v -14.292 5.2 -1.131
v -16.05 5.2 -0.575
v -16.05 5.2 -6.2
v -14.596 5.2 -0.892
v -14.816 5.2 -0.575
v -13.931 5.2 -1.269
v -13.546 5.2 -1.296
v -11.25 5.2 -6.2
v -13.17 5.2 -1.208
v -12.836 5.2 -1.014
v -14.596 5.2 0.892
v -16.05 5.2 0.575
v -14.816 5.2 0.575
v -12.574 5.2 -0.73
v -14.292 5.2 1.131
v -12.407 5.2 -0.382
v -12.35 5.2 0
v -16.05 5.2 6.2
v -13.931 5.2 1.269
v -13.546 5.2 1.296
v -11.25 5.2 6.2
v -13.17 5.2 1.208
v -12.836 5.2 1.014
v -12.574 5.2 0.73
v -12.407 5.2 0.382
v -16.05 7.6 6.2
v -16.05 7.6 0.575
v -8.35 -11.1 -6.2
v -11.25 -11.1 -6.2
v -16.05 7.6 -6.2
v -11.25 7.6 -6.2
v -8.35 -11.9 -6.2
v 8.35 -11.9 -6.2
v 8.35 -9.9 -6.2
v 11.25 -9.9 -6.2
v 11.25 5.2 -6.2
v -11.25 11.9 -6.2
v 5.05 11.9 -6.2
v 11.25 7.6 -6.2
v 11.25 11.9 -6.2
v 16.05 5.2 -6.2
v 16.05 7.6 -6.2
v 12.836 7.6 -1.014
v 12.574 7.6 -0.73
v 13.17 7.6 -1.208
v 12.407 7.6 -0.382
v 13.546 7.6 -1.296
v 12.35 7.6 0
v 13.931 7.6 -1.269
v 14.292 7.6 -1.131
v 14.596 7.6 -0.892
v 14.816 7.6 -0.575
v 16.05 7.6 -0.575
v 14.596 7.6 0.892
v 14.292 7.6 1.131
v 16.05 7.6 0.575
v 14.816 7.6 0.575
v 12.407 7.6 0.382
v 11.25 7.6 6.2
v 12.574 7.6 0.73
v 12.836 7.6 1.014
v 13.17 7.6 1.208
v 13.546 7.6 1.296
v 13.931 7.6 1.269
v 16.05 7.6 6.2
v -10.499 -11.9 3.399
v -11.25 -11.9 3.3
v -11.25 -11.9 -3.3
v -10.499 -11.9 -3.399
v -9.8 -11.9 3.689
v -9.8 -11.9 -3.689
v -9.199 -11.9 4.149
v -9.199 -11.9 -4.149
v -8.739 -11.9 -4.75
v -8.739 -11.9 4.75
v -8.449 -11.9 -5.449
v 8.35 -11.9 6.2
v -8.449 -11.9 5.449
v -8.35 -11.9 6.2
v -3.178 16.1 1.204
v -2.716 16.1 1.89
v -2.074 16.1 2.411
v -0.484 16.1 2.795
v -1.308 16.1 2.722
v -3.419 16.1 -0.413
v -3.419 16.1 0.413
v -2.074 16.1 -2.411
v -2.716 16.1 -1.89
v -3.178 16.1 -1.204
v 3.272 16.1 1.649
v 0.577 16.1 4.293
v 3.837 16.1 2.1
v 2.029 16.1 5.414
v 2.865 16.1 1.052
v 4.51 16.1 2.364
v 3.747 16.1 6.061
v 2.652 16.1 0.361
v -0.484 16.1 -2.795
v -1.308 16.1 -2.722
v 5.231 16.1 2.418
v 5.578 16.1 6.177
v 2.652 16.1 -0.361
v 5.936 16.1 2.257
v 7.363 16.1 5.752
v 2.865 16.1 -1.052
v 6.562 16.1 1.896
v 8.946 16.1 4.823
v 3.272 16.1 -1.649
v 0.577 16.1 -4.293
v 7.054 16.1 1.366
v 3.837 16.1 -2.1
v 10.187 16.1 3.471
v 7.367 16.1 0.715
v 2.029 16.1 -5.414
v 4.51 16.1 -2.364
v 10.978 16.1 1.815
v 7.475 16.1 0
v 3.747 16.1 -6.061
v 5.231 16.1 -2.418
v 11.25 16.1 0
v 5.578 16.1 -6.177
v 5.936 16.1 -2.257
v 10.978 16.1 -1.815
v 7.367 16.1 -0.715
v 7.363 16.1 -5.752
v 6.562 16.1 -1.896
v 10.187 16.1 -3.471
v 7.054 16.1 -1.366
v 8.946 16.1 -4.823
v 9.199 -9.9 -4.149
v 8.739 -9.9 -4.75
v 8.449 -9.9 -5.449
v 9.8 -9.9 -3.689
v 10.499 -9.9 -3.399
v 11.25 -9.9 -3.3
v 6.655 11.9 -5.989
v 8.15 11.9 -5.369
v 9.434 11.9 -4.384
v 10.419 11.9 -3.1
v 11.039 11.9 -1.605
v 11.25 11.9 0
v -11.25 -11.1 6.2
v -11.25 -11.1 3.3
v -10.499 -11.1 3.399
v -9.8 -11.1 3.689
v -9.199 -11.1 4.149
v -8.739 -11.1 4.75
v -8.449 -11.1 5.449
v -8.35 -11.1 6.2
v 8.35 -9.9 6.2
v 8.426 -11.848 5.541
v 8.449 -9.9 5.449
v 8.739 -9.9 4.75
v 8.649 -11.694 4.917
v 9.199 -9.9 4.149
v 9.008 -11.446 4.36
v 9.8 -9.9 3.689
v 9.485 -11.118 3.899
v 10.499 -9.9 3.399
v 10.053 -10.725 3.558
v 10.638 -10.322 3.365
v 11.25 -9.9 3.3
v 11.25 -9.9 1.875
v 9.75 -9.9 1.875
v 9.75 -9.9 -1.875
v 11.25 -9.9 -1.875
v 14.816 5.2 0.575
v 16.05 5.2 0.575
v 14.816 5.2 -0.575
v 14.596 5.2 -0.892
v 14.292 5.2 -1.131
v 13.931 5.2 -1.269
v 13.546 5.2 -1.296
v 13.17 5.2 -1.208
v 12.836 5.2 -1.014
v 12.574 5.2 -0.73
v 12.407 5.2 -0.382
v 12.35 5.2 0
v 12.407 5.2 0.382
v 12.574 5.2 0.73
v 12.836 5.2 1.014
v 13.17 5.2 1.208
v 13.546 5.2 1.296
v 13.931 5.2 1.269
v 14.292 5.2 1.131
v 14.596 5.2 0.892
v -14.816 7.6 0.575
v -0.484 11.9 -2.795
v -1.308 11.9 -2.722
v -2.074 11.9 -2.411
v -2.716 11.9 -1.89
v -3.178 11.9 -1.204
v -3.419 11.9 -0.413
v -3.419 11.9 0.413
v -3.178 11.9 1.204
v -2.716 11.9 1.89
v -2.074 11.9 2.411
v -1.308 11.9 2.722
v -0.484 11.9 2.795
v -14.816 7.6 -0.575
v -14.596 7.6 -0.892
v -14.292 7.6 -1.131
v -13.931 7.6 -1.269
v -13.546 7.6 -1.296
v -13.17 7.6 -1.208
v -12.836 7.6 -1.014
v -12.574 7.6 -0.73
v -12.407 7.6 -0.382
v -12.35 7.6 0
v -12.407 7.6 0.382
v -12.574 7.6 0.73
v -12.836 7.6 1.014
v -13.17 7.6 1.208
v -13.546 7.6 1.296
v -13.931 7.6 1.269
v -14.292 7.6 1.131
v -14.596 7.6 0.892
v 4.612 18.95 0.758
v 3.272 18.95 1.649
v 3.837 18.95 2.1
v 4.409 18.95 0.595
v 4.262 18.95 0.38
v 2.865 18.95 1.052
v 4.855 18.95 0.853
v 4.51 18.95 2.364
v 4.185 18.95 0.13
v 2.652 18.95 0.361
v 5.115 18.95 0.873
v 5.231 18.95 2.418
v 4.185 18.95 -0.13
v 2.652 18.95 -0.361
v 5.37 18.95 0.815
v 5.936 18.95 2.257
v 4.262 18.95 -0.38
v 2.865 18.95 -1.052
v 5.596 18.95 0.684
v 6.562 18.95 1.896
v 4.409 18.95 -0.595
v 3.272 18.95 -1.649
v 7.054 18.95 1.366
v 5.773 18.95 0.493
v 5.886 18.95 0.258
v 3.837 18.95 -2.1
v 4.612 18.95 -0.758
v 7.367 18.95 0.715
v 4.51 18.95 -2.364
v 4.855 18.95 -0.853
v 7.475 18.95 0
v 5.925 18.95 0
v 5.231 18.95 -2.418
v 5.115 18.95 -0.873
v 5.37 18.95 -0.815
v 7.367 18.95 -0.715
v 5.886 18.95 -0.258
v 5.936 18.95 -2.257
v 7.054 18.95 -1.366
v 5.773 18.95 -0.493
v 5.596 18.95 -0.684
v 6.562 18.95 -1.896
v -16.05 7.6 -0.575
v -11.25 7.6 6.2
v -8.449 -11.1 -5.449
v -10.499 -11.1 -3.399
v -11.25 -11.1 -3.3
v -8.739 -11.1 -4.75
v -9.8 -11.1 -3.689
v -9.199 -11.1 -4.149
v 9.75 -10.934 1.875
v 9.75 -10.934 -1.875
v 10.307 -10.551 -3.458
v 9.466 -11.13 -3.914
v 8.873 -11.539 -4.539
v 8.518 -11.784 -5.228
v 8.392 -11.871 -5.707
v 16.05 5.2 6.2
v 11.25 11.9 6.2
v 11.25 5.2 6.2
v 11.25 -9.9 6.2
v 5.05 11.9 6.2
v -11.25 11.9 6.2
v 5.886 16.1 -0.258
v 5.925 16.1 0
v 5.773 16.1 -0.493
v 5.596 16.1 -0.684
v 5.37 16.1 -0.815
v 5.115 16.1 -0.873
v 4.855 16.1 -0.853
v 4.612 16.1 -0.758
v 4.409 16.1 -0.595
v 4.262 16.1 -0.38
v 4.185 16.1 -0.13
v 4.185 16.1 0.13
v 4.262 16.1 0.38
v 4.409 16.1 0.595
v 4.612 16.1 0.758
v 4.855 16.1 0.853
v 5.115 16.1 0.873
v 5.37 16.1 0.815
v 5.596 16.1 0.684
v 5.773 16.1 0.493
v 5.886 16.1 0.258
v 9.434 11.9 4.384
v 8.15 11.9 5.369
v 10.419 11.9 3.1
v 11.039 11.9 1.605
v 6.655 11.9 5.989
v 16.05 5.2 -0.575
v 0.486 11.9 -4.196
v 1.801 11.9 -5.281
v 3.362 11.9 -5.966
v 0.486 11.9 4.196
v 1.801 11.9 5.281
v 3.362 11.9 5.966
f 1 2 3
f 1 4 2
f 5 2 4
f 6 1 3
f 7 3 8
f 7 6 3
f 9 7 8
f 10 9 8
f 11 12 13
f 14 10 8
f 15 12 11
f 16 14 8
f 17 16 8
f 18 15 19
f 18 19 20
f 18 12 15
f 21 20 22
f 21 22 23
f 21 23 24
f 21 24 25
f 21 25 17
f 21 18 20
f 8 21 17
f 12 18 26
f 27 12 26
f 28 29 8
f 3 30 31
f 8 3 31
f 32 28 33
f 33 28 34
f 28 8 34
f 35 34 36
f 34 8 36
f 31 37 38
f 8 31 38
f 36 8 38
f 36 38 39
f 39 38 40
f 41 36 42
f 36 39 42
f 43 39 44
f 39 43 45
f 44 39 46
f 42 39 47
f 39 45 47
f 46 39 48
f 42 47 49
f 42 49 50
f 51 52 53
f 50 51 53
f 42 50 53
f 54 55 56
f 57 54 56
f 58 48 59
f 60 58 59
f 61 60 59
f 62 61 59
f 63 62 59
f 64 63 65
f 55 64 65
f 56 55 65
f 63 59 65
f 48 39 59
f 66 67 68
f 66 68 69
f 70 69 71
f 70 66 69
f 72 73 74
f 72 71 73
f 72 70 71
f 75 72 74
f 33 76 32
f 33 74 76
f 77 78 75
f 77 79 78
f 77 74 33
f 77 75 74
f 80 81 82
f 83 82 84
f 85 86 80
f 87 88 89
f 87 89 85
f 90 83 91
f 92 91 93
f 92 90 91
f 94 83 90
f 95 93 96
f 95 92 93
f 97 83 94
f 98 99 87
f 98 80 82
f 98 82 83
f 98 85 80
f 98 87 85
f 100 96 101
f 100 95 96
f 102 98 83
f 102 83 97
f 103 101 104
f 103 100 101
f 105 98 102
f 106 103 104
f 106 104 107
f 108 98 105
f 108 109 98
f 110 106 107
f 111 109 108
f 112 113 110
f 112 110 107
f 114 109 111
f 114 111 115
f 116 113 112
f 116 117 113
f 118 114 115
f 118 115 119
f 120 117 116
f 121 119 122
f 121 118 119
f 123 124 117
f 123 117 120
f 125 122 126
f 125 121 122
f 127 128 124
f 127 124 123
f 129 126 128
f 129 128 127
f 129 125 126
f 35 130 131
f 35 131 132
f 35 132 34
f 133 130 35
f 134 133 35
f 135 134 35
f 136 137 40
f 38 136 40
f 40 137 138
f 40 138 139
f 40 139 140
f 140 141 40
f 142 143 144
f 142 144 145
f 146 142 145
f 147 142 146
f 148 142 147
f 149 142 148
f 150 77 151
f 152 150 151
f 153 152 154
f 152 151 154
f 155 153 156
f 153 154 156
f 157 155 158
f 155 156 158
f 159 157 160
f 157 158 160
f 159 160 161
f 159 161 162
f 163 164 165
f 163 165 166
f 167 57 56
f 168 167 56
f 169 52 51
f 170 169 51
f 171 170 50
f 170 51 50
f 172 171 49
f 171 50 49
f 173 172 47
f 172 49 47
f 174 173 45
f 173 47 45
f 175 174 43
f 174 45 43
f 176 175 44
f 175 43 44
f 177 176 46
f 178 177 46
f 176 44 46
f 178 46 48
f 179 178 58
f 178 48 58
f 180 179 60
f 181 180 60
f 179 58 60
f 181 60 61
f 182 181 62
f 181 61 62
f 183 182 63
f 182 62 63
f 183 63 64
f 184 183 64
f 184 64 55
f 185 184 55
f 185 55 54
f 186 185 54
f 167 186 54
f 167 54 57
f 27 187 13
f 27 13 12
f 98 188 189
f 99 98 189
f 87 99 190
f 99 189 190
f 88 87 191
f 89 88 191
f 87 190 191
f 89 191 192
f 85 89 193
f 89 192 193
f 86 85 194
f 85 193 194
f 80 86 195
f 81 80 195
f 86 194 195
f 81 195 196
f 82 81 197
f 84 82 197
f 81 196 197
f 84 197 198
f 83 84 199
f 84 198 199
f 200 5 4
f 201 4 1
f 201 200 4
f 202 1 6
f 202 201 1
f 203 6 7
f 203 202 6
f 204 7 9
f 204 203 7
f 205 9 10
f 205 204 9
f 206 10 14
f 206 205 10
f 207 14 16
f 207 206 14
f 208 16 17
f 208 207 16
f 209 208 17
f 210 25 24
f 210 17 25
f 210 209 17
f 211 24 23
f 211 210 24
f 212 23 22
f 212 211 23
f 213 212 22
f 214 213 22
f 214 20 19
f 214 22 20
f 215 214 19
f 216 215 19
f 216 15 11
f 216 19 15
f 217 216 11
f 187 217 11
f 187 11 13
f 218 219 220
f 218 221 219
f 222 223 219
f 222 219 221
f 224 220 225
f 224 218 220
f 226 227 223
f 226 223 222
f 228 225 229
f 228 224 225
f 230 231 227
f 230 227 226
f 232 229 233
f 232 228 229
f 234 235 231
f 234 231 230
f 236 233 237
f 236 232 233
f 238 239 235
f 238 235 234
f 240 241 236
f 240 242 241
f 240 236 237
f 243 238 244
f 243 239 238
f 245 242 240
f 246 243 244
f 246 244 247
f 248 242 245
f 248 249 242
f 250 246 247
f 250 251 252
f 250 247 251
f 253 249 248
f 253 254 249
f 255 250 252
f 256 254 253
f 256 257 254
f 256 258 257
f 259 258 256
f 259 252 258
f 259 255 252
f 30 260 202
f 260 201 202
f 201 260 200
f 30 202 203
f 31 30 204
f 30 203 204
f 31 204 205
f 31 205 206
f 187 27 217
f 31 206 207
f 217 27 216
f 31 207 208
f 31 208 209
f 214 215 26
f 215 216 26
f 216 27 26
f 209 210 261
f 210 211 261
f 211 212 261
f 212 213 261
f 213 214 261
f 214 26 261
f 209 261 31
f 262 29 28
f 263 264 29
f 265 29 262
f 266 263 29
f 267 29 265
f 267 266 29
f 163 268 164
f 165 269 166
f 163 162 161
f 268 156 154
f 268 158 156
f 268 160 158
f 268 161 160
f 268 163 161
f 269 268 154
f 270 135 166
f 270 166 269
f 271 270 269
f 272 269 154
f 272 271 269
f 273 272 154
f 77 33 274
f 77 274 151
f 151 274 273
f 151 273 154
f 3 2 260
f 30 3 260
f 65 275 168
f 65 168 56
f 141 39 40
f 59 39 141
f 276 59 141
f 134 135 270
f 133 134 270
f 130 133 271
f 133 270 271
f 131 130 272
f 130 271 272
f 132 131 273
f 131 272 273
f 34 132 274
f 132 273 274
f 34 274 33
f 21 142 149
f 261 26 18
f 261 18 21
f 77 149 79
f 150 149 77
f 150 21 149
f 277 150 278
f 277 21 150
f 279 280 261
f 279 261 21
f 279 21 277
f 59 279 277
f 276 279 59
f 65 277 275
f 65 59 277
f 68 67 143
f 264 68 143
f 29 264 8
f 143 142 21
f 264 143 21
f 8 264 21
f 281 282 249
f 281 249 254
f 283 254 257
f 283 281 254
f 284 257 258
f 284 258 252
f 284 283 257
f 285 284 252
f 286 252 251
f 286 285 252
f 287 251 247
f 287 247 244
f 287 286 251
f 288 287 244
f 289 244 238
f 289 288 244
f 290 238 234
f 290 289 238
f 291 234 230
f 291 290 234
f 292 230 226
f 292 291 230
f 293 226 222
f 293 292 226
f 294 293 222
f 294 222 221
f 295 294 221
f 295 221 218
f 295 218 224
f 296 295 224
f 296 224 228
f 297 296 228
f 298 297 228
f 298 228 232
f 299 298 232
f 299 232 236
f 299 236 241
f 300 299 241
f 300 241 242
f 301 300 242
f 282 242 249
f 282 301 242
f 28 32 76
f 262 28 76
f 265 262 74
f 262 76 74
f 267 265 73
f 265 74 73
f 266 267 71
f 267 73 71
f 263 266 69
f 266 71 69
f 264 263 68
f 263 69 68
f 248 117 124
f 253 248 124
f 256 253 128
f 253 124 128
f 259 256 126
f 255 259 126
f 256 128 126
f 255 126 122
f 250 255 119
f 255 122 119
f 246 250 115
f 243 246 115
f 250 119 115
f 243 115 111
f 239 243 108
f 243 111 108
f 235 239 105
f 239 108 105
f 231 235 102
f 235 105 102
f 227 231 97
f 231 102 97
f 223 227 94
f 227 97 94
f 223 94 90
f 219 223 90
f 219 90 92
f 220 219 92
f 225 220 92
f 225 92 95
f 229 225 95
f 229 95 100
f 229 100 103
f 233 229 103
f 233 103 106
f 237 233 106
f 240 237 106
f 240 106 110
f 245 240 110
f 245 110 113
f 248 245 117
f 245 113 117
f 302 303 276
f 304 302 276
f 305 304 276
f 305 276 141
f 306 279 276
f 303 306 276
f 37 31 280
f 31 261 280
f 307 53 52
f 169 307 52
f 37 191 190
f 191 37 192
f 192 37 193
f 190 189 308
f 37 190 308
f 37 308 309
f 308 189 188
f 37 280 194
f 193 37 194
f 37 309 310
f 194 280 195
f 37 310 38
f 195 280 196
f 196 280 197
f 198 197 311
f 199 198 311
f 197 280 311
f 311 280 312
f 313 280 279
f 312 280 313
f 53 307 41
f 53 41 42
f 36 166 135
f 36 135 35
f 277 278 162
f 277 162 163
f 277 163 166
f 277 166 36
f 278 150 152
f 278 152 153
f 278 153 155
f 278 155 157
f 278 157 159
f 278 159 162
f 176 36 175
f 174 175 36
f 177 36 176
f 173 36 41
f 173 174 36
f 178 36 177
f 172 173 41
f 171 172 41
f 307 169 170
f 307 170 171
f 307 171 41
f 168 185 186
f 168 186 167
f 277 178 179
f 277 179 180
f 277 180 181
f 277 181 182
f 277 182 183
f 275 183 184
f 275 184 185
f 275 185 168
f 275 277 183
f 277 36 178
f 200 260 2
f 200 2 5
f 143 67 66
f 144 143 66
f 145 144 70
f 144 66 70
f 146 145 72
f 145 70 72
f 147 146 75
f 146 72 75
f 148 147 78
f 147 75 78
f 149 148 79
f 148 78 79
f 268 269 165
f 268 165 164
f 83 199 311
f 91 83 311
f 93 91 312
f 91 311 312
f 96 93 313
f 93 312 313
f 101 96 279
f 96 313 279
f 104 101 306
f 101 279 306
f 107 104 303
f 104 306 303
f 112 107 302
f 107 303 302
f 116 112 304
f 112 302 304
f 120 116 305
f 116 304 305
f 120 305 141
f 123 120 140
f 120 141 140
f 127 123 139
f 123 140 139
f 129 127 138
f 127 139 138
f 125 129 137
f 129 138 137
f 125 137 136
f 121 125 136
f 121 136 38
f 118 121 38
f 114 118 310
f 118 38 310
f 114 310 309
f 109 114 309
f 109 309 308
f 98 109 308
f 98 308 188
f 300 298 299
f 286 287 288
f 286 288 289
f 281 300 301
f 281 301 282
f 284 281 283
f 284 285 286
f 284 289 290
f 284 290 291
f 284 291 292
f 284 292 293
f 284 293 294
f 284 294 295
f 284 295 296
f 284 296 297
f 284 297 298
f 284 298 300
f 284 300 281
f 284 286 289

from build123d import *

# Parameters (mm, degrees)
SALIENTE_EXTRUIR1_DEPTH = 6.2
SALIENTE_EXTRUIR2_DEPTH = 4.2
CORTAR_EXTRUIR1_REACH   = 28.006
CORTAR_EXTRUIR3_DEPTH   = 0.8
CROQUIS4_5_W            = 1.5
CROQUIS4_5_H            = 3.75
CORTAR_EXTRUIR4_DEPTH   = 2
CORTAR_EXTRUIR5_DEPTH   = 26.895414652
CROQUIS7_R              = 2.425
CROQUIS7_R_2            = 0.875
SALIENTE_EXTRUIR4_DEPTH = 2.85


with BuildPart() as part:
    # Croquis1 → Saliente-Extruir1 (new, symmetric)
    with BuildSketch(Plane.XY):
        Polygon((-11.25, 5.2), (-11.25, -11.9), (11.25, -11.9), (11.25, 5.2), (16.05, 5.2), (16.05, 7.6), (11.25, 7.6), (11.25, 11.9), (-11.25, 11.9), (-11.25, 7.6), (-16.05, 7.6), (-16.05, 5.2), align=None)
    extrude(amount=SALIENTE_EXTRUIR1_DEPTH, both=True)

    # Croquis2 → Saliente-Extruir2 (add)
    with BuildSketch(Plane(origin=(0, 11.9, 0), x_dir=(1, 0, 0), z_dir=(0, 1, 0))):
        with BuildLine():
            ThreePointArc((-0.484210526, -2.79508745), (11.25, 0), (-0.484210526, 2.79508745))
            ThreePointArc((-0.484210526, 2.79508745), (-3.45, 0), (-0.484210526, -2.79508745))
        make_face()
    extrude(amount=SALIENTE_EXTRUIR2_DEPTH)

    # Croquis3 → Cortar-Extruir1 (cut, up to next)
    with BuildSketch(Plane(origin=(0, 7.6, 0), x_dir=(1, 0, 0), z_dir=(0, 1, 0)), mode=Mode.PRIVATE) as cortar_extruir1_sk1:
        with BuildLine():
            Line((16.05, 0.575), (14.815922382, 0.575))
            ThreePointArc((14.815922382, 0.575), (12.35, 0), (14.815922382, -0.575))
            Line((14.815922382, -0.575), (16.05, -0.575))
            Line((16.05, -0.575), (16.05, 0.575))
        make_face()
    cortar_extruir1_tool1 = extrude(cortar_extruir1_sk1.sketch, amount=-CORTAR_EXTRUIR1_REACH, mode=Mode.PRIVATE) & part.part
    # Croquis3 → Cortar-Extruir1 (cut, up to next)
    with BuildSketch(Plane(origin=(0, 7.6, 0), x_dir=(1, 0, 0), z_dir=(0, 1, 0)), mode=Mode.PRIVATE) as cortar_extruir1_sk2:
        with BuildLine():
            Line((-16.05, 0.575), (-14.815922382, 0.575))
            ThreePointArc((-14.815922382, 0.575), (-12.35, 0), (-14.815922382, -0.575))
            Line((-14.815922382, -0.575), (-16.05, -0.575))
            Line((-16.05, -0.575), (-16.05, 0.575))
        make_face()
    cortar_extruir1_tool2 = extrude(cortar_extruir1_sk2.sketch, amount=-CORTAR_EXTRUIR1_REACH, mode=Mode.PRIVATE) & part.part
    add(cortar_extruir1_tool1.solids().sort_by_distance((14.012834, 7.6, 0))[0], mode=Mode.SUBTRACT)
    add(cortar_extruir1_tool2.solids().sort_by_distance((-14.012834, 7.6, 0))[0], mode=Mode.SUBTRACT)

    # Croquis4 → Cortar-Extruir3 (cut)
    with BuildSketch(Plane.XZ.offset(11.9)):
        with BuildLine():
            Line((-11.25, 6.2), (-11.25, 3.3))
            ThreePointArc((-11.25, 3.3), (-9.199390335, 4.149390335), (-8.35, 6.2))
            Line((-8.35, 6.2), (-11.25, 6.2))
        make_face()
        with BuildLine():
            ThreePointArc((-8.35, -6.2), (-9.199390335, -4.149390335), (-11.25, -3.3))
            Line((-11.25, -3.3), (-11.25, -6.2))
            Line((-11.25, -6.2), (-8.35, -6.2))
        make_face()
    extrude(amount=-CORTAR_EXTRUIR3_DEPTH, mode=Mode.SUBTRACT)

    # Croquis4<5> → Cortar-Extruir4 (cut)
    with BuildSketch(Plane.XZ.offset(11.9)):
        with BuildLine():
            Line((11.25, 6.2), (8.35, 6.2))
            ThreePointArc((8.35, 6.2), (9.199390335, 4.149390335), (11.25, 3.3))
            Line((11.25, 3.3), (11.25, 6.2))
        make_face()
        with BuildLine():
            ThreePointArc((11.25, -3.3), (9.199390335, -4.149390335), (8.35, -6.2))
            Line((8.35, -6.2), (11.25, -6.2))
            Line((11.25, -6.2), (11.25, -3.3))
        make_face()
        with Locations((10.5, 0)):
            Rectangle(CROQUIS4_5_W, CROQUIS4_5_H)
    extrude(amount=-CORTAR_EXTRUIR4_DEPTH, mode=Mode.SUBTRACT)

    # Croquis6 → Cortar-Extruir5 (cut, through all)
    with BuildSketch(Plane(origin=(0, 0, -6.2), x_dir=(-1, 0, 0), z_dir=(0, 0, -1))):
        Polygon((-11.25, -9.9), (-8.35, -11.9), (-11.25, -11.9), align=None)
    extrude(amount=-CORTAR_EXTRUIR5_DEPTH, mode=Mode.SUBTRACT)

    # Croquis7 → Saliente-Extruir4 (add)
    with BuildSketch(Plane(origin=(0, 16.1, 0), x_dir=(1, 0, 0), z_dir=(0, 1, 0))):
        with Locations((5.05, 0)):
            Circle(CROQUIS7_R)
        with Locations((5.05, 0)):
            Circle(CROQUIS7_R_2, mode=Mode.SUBTRACT)
    extrude(amount=SALIENTE_EXTRUIR4_DEPTH)


solid = part.part
